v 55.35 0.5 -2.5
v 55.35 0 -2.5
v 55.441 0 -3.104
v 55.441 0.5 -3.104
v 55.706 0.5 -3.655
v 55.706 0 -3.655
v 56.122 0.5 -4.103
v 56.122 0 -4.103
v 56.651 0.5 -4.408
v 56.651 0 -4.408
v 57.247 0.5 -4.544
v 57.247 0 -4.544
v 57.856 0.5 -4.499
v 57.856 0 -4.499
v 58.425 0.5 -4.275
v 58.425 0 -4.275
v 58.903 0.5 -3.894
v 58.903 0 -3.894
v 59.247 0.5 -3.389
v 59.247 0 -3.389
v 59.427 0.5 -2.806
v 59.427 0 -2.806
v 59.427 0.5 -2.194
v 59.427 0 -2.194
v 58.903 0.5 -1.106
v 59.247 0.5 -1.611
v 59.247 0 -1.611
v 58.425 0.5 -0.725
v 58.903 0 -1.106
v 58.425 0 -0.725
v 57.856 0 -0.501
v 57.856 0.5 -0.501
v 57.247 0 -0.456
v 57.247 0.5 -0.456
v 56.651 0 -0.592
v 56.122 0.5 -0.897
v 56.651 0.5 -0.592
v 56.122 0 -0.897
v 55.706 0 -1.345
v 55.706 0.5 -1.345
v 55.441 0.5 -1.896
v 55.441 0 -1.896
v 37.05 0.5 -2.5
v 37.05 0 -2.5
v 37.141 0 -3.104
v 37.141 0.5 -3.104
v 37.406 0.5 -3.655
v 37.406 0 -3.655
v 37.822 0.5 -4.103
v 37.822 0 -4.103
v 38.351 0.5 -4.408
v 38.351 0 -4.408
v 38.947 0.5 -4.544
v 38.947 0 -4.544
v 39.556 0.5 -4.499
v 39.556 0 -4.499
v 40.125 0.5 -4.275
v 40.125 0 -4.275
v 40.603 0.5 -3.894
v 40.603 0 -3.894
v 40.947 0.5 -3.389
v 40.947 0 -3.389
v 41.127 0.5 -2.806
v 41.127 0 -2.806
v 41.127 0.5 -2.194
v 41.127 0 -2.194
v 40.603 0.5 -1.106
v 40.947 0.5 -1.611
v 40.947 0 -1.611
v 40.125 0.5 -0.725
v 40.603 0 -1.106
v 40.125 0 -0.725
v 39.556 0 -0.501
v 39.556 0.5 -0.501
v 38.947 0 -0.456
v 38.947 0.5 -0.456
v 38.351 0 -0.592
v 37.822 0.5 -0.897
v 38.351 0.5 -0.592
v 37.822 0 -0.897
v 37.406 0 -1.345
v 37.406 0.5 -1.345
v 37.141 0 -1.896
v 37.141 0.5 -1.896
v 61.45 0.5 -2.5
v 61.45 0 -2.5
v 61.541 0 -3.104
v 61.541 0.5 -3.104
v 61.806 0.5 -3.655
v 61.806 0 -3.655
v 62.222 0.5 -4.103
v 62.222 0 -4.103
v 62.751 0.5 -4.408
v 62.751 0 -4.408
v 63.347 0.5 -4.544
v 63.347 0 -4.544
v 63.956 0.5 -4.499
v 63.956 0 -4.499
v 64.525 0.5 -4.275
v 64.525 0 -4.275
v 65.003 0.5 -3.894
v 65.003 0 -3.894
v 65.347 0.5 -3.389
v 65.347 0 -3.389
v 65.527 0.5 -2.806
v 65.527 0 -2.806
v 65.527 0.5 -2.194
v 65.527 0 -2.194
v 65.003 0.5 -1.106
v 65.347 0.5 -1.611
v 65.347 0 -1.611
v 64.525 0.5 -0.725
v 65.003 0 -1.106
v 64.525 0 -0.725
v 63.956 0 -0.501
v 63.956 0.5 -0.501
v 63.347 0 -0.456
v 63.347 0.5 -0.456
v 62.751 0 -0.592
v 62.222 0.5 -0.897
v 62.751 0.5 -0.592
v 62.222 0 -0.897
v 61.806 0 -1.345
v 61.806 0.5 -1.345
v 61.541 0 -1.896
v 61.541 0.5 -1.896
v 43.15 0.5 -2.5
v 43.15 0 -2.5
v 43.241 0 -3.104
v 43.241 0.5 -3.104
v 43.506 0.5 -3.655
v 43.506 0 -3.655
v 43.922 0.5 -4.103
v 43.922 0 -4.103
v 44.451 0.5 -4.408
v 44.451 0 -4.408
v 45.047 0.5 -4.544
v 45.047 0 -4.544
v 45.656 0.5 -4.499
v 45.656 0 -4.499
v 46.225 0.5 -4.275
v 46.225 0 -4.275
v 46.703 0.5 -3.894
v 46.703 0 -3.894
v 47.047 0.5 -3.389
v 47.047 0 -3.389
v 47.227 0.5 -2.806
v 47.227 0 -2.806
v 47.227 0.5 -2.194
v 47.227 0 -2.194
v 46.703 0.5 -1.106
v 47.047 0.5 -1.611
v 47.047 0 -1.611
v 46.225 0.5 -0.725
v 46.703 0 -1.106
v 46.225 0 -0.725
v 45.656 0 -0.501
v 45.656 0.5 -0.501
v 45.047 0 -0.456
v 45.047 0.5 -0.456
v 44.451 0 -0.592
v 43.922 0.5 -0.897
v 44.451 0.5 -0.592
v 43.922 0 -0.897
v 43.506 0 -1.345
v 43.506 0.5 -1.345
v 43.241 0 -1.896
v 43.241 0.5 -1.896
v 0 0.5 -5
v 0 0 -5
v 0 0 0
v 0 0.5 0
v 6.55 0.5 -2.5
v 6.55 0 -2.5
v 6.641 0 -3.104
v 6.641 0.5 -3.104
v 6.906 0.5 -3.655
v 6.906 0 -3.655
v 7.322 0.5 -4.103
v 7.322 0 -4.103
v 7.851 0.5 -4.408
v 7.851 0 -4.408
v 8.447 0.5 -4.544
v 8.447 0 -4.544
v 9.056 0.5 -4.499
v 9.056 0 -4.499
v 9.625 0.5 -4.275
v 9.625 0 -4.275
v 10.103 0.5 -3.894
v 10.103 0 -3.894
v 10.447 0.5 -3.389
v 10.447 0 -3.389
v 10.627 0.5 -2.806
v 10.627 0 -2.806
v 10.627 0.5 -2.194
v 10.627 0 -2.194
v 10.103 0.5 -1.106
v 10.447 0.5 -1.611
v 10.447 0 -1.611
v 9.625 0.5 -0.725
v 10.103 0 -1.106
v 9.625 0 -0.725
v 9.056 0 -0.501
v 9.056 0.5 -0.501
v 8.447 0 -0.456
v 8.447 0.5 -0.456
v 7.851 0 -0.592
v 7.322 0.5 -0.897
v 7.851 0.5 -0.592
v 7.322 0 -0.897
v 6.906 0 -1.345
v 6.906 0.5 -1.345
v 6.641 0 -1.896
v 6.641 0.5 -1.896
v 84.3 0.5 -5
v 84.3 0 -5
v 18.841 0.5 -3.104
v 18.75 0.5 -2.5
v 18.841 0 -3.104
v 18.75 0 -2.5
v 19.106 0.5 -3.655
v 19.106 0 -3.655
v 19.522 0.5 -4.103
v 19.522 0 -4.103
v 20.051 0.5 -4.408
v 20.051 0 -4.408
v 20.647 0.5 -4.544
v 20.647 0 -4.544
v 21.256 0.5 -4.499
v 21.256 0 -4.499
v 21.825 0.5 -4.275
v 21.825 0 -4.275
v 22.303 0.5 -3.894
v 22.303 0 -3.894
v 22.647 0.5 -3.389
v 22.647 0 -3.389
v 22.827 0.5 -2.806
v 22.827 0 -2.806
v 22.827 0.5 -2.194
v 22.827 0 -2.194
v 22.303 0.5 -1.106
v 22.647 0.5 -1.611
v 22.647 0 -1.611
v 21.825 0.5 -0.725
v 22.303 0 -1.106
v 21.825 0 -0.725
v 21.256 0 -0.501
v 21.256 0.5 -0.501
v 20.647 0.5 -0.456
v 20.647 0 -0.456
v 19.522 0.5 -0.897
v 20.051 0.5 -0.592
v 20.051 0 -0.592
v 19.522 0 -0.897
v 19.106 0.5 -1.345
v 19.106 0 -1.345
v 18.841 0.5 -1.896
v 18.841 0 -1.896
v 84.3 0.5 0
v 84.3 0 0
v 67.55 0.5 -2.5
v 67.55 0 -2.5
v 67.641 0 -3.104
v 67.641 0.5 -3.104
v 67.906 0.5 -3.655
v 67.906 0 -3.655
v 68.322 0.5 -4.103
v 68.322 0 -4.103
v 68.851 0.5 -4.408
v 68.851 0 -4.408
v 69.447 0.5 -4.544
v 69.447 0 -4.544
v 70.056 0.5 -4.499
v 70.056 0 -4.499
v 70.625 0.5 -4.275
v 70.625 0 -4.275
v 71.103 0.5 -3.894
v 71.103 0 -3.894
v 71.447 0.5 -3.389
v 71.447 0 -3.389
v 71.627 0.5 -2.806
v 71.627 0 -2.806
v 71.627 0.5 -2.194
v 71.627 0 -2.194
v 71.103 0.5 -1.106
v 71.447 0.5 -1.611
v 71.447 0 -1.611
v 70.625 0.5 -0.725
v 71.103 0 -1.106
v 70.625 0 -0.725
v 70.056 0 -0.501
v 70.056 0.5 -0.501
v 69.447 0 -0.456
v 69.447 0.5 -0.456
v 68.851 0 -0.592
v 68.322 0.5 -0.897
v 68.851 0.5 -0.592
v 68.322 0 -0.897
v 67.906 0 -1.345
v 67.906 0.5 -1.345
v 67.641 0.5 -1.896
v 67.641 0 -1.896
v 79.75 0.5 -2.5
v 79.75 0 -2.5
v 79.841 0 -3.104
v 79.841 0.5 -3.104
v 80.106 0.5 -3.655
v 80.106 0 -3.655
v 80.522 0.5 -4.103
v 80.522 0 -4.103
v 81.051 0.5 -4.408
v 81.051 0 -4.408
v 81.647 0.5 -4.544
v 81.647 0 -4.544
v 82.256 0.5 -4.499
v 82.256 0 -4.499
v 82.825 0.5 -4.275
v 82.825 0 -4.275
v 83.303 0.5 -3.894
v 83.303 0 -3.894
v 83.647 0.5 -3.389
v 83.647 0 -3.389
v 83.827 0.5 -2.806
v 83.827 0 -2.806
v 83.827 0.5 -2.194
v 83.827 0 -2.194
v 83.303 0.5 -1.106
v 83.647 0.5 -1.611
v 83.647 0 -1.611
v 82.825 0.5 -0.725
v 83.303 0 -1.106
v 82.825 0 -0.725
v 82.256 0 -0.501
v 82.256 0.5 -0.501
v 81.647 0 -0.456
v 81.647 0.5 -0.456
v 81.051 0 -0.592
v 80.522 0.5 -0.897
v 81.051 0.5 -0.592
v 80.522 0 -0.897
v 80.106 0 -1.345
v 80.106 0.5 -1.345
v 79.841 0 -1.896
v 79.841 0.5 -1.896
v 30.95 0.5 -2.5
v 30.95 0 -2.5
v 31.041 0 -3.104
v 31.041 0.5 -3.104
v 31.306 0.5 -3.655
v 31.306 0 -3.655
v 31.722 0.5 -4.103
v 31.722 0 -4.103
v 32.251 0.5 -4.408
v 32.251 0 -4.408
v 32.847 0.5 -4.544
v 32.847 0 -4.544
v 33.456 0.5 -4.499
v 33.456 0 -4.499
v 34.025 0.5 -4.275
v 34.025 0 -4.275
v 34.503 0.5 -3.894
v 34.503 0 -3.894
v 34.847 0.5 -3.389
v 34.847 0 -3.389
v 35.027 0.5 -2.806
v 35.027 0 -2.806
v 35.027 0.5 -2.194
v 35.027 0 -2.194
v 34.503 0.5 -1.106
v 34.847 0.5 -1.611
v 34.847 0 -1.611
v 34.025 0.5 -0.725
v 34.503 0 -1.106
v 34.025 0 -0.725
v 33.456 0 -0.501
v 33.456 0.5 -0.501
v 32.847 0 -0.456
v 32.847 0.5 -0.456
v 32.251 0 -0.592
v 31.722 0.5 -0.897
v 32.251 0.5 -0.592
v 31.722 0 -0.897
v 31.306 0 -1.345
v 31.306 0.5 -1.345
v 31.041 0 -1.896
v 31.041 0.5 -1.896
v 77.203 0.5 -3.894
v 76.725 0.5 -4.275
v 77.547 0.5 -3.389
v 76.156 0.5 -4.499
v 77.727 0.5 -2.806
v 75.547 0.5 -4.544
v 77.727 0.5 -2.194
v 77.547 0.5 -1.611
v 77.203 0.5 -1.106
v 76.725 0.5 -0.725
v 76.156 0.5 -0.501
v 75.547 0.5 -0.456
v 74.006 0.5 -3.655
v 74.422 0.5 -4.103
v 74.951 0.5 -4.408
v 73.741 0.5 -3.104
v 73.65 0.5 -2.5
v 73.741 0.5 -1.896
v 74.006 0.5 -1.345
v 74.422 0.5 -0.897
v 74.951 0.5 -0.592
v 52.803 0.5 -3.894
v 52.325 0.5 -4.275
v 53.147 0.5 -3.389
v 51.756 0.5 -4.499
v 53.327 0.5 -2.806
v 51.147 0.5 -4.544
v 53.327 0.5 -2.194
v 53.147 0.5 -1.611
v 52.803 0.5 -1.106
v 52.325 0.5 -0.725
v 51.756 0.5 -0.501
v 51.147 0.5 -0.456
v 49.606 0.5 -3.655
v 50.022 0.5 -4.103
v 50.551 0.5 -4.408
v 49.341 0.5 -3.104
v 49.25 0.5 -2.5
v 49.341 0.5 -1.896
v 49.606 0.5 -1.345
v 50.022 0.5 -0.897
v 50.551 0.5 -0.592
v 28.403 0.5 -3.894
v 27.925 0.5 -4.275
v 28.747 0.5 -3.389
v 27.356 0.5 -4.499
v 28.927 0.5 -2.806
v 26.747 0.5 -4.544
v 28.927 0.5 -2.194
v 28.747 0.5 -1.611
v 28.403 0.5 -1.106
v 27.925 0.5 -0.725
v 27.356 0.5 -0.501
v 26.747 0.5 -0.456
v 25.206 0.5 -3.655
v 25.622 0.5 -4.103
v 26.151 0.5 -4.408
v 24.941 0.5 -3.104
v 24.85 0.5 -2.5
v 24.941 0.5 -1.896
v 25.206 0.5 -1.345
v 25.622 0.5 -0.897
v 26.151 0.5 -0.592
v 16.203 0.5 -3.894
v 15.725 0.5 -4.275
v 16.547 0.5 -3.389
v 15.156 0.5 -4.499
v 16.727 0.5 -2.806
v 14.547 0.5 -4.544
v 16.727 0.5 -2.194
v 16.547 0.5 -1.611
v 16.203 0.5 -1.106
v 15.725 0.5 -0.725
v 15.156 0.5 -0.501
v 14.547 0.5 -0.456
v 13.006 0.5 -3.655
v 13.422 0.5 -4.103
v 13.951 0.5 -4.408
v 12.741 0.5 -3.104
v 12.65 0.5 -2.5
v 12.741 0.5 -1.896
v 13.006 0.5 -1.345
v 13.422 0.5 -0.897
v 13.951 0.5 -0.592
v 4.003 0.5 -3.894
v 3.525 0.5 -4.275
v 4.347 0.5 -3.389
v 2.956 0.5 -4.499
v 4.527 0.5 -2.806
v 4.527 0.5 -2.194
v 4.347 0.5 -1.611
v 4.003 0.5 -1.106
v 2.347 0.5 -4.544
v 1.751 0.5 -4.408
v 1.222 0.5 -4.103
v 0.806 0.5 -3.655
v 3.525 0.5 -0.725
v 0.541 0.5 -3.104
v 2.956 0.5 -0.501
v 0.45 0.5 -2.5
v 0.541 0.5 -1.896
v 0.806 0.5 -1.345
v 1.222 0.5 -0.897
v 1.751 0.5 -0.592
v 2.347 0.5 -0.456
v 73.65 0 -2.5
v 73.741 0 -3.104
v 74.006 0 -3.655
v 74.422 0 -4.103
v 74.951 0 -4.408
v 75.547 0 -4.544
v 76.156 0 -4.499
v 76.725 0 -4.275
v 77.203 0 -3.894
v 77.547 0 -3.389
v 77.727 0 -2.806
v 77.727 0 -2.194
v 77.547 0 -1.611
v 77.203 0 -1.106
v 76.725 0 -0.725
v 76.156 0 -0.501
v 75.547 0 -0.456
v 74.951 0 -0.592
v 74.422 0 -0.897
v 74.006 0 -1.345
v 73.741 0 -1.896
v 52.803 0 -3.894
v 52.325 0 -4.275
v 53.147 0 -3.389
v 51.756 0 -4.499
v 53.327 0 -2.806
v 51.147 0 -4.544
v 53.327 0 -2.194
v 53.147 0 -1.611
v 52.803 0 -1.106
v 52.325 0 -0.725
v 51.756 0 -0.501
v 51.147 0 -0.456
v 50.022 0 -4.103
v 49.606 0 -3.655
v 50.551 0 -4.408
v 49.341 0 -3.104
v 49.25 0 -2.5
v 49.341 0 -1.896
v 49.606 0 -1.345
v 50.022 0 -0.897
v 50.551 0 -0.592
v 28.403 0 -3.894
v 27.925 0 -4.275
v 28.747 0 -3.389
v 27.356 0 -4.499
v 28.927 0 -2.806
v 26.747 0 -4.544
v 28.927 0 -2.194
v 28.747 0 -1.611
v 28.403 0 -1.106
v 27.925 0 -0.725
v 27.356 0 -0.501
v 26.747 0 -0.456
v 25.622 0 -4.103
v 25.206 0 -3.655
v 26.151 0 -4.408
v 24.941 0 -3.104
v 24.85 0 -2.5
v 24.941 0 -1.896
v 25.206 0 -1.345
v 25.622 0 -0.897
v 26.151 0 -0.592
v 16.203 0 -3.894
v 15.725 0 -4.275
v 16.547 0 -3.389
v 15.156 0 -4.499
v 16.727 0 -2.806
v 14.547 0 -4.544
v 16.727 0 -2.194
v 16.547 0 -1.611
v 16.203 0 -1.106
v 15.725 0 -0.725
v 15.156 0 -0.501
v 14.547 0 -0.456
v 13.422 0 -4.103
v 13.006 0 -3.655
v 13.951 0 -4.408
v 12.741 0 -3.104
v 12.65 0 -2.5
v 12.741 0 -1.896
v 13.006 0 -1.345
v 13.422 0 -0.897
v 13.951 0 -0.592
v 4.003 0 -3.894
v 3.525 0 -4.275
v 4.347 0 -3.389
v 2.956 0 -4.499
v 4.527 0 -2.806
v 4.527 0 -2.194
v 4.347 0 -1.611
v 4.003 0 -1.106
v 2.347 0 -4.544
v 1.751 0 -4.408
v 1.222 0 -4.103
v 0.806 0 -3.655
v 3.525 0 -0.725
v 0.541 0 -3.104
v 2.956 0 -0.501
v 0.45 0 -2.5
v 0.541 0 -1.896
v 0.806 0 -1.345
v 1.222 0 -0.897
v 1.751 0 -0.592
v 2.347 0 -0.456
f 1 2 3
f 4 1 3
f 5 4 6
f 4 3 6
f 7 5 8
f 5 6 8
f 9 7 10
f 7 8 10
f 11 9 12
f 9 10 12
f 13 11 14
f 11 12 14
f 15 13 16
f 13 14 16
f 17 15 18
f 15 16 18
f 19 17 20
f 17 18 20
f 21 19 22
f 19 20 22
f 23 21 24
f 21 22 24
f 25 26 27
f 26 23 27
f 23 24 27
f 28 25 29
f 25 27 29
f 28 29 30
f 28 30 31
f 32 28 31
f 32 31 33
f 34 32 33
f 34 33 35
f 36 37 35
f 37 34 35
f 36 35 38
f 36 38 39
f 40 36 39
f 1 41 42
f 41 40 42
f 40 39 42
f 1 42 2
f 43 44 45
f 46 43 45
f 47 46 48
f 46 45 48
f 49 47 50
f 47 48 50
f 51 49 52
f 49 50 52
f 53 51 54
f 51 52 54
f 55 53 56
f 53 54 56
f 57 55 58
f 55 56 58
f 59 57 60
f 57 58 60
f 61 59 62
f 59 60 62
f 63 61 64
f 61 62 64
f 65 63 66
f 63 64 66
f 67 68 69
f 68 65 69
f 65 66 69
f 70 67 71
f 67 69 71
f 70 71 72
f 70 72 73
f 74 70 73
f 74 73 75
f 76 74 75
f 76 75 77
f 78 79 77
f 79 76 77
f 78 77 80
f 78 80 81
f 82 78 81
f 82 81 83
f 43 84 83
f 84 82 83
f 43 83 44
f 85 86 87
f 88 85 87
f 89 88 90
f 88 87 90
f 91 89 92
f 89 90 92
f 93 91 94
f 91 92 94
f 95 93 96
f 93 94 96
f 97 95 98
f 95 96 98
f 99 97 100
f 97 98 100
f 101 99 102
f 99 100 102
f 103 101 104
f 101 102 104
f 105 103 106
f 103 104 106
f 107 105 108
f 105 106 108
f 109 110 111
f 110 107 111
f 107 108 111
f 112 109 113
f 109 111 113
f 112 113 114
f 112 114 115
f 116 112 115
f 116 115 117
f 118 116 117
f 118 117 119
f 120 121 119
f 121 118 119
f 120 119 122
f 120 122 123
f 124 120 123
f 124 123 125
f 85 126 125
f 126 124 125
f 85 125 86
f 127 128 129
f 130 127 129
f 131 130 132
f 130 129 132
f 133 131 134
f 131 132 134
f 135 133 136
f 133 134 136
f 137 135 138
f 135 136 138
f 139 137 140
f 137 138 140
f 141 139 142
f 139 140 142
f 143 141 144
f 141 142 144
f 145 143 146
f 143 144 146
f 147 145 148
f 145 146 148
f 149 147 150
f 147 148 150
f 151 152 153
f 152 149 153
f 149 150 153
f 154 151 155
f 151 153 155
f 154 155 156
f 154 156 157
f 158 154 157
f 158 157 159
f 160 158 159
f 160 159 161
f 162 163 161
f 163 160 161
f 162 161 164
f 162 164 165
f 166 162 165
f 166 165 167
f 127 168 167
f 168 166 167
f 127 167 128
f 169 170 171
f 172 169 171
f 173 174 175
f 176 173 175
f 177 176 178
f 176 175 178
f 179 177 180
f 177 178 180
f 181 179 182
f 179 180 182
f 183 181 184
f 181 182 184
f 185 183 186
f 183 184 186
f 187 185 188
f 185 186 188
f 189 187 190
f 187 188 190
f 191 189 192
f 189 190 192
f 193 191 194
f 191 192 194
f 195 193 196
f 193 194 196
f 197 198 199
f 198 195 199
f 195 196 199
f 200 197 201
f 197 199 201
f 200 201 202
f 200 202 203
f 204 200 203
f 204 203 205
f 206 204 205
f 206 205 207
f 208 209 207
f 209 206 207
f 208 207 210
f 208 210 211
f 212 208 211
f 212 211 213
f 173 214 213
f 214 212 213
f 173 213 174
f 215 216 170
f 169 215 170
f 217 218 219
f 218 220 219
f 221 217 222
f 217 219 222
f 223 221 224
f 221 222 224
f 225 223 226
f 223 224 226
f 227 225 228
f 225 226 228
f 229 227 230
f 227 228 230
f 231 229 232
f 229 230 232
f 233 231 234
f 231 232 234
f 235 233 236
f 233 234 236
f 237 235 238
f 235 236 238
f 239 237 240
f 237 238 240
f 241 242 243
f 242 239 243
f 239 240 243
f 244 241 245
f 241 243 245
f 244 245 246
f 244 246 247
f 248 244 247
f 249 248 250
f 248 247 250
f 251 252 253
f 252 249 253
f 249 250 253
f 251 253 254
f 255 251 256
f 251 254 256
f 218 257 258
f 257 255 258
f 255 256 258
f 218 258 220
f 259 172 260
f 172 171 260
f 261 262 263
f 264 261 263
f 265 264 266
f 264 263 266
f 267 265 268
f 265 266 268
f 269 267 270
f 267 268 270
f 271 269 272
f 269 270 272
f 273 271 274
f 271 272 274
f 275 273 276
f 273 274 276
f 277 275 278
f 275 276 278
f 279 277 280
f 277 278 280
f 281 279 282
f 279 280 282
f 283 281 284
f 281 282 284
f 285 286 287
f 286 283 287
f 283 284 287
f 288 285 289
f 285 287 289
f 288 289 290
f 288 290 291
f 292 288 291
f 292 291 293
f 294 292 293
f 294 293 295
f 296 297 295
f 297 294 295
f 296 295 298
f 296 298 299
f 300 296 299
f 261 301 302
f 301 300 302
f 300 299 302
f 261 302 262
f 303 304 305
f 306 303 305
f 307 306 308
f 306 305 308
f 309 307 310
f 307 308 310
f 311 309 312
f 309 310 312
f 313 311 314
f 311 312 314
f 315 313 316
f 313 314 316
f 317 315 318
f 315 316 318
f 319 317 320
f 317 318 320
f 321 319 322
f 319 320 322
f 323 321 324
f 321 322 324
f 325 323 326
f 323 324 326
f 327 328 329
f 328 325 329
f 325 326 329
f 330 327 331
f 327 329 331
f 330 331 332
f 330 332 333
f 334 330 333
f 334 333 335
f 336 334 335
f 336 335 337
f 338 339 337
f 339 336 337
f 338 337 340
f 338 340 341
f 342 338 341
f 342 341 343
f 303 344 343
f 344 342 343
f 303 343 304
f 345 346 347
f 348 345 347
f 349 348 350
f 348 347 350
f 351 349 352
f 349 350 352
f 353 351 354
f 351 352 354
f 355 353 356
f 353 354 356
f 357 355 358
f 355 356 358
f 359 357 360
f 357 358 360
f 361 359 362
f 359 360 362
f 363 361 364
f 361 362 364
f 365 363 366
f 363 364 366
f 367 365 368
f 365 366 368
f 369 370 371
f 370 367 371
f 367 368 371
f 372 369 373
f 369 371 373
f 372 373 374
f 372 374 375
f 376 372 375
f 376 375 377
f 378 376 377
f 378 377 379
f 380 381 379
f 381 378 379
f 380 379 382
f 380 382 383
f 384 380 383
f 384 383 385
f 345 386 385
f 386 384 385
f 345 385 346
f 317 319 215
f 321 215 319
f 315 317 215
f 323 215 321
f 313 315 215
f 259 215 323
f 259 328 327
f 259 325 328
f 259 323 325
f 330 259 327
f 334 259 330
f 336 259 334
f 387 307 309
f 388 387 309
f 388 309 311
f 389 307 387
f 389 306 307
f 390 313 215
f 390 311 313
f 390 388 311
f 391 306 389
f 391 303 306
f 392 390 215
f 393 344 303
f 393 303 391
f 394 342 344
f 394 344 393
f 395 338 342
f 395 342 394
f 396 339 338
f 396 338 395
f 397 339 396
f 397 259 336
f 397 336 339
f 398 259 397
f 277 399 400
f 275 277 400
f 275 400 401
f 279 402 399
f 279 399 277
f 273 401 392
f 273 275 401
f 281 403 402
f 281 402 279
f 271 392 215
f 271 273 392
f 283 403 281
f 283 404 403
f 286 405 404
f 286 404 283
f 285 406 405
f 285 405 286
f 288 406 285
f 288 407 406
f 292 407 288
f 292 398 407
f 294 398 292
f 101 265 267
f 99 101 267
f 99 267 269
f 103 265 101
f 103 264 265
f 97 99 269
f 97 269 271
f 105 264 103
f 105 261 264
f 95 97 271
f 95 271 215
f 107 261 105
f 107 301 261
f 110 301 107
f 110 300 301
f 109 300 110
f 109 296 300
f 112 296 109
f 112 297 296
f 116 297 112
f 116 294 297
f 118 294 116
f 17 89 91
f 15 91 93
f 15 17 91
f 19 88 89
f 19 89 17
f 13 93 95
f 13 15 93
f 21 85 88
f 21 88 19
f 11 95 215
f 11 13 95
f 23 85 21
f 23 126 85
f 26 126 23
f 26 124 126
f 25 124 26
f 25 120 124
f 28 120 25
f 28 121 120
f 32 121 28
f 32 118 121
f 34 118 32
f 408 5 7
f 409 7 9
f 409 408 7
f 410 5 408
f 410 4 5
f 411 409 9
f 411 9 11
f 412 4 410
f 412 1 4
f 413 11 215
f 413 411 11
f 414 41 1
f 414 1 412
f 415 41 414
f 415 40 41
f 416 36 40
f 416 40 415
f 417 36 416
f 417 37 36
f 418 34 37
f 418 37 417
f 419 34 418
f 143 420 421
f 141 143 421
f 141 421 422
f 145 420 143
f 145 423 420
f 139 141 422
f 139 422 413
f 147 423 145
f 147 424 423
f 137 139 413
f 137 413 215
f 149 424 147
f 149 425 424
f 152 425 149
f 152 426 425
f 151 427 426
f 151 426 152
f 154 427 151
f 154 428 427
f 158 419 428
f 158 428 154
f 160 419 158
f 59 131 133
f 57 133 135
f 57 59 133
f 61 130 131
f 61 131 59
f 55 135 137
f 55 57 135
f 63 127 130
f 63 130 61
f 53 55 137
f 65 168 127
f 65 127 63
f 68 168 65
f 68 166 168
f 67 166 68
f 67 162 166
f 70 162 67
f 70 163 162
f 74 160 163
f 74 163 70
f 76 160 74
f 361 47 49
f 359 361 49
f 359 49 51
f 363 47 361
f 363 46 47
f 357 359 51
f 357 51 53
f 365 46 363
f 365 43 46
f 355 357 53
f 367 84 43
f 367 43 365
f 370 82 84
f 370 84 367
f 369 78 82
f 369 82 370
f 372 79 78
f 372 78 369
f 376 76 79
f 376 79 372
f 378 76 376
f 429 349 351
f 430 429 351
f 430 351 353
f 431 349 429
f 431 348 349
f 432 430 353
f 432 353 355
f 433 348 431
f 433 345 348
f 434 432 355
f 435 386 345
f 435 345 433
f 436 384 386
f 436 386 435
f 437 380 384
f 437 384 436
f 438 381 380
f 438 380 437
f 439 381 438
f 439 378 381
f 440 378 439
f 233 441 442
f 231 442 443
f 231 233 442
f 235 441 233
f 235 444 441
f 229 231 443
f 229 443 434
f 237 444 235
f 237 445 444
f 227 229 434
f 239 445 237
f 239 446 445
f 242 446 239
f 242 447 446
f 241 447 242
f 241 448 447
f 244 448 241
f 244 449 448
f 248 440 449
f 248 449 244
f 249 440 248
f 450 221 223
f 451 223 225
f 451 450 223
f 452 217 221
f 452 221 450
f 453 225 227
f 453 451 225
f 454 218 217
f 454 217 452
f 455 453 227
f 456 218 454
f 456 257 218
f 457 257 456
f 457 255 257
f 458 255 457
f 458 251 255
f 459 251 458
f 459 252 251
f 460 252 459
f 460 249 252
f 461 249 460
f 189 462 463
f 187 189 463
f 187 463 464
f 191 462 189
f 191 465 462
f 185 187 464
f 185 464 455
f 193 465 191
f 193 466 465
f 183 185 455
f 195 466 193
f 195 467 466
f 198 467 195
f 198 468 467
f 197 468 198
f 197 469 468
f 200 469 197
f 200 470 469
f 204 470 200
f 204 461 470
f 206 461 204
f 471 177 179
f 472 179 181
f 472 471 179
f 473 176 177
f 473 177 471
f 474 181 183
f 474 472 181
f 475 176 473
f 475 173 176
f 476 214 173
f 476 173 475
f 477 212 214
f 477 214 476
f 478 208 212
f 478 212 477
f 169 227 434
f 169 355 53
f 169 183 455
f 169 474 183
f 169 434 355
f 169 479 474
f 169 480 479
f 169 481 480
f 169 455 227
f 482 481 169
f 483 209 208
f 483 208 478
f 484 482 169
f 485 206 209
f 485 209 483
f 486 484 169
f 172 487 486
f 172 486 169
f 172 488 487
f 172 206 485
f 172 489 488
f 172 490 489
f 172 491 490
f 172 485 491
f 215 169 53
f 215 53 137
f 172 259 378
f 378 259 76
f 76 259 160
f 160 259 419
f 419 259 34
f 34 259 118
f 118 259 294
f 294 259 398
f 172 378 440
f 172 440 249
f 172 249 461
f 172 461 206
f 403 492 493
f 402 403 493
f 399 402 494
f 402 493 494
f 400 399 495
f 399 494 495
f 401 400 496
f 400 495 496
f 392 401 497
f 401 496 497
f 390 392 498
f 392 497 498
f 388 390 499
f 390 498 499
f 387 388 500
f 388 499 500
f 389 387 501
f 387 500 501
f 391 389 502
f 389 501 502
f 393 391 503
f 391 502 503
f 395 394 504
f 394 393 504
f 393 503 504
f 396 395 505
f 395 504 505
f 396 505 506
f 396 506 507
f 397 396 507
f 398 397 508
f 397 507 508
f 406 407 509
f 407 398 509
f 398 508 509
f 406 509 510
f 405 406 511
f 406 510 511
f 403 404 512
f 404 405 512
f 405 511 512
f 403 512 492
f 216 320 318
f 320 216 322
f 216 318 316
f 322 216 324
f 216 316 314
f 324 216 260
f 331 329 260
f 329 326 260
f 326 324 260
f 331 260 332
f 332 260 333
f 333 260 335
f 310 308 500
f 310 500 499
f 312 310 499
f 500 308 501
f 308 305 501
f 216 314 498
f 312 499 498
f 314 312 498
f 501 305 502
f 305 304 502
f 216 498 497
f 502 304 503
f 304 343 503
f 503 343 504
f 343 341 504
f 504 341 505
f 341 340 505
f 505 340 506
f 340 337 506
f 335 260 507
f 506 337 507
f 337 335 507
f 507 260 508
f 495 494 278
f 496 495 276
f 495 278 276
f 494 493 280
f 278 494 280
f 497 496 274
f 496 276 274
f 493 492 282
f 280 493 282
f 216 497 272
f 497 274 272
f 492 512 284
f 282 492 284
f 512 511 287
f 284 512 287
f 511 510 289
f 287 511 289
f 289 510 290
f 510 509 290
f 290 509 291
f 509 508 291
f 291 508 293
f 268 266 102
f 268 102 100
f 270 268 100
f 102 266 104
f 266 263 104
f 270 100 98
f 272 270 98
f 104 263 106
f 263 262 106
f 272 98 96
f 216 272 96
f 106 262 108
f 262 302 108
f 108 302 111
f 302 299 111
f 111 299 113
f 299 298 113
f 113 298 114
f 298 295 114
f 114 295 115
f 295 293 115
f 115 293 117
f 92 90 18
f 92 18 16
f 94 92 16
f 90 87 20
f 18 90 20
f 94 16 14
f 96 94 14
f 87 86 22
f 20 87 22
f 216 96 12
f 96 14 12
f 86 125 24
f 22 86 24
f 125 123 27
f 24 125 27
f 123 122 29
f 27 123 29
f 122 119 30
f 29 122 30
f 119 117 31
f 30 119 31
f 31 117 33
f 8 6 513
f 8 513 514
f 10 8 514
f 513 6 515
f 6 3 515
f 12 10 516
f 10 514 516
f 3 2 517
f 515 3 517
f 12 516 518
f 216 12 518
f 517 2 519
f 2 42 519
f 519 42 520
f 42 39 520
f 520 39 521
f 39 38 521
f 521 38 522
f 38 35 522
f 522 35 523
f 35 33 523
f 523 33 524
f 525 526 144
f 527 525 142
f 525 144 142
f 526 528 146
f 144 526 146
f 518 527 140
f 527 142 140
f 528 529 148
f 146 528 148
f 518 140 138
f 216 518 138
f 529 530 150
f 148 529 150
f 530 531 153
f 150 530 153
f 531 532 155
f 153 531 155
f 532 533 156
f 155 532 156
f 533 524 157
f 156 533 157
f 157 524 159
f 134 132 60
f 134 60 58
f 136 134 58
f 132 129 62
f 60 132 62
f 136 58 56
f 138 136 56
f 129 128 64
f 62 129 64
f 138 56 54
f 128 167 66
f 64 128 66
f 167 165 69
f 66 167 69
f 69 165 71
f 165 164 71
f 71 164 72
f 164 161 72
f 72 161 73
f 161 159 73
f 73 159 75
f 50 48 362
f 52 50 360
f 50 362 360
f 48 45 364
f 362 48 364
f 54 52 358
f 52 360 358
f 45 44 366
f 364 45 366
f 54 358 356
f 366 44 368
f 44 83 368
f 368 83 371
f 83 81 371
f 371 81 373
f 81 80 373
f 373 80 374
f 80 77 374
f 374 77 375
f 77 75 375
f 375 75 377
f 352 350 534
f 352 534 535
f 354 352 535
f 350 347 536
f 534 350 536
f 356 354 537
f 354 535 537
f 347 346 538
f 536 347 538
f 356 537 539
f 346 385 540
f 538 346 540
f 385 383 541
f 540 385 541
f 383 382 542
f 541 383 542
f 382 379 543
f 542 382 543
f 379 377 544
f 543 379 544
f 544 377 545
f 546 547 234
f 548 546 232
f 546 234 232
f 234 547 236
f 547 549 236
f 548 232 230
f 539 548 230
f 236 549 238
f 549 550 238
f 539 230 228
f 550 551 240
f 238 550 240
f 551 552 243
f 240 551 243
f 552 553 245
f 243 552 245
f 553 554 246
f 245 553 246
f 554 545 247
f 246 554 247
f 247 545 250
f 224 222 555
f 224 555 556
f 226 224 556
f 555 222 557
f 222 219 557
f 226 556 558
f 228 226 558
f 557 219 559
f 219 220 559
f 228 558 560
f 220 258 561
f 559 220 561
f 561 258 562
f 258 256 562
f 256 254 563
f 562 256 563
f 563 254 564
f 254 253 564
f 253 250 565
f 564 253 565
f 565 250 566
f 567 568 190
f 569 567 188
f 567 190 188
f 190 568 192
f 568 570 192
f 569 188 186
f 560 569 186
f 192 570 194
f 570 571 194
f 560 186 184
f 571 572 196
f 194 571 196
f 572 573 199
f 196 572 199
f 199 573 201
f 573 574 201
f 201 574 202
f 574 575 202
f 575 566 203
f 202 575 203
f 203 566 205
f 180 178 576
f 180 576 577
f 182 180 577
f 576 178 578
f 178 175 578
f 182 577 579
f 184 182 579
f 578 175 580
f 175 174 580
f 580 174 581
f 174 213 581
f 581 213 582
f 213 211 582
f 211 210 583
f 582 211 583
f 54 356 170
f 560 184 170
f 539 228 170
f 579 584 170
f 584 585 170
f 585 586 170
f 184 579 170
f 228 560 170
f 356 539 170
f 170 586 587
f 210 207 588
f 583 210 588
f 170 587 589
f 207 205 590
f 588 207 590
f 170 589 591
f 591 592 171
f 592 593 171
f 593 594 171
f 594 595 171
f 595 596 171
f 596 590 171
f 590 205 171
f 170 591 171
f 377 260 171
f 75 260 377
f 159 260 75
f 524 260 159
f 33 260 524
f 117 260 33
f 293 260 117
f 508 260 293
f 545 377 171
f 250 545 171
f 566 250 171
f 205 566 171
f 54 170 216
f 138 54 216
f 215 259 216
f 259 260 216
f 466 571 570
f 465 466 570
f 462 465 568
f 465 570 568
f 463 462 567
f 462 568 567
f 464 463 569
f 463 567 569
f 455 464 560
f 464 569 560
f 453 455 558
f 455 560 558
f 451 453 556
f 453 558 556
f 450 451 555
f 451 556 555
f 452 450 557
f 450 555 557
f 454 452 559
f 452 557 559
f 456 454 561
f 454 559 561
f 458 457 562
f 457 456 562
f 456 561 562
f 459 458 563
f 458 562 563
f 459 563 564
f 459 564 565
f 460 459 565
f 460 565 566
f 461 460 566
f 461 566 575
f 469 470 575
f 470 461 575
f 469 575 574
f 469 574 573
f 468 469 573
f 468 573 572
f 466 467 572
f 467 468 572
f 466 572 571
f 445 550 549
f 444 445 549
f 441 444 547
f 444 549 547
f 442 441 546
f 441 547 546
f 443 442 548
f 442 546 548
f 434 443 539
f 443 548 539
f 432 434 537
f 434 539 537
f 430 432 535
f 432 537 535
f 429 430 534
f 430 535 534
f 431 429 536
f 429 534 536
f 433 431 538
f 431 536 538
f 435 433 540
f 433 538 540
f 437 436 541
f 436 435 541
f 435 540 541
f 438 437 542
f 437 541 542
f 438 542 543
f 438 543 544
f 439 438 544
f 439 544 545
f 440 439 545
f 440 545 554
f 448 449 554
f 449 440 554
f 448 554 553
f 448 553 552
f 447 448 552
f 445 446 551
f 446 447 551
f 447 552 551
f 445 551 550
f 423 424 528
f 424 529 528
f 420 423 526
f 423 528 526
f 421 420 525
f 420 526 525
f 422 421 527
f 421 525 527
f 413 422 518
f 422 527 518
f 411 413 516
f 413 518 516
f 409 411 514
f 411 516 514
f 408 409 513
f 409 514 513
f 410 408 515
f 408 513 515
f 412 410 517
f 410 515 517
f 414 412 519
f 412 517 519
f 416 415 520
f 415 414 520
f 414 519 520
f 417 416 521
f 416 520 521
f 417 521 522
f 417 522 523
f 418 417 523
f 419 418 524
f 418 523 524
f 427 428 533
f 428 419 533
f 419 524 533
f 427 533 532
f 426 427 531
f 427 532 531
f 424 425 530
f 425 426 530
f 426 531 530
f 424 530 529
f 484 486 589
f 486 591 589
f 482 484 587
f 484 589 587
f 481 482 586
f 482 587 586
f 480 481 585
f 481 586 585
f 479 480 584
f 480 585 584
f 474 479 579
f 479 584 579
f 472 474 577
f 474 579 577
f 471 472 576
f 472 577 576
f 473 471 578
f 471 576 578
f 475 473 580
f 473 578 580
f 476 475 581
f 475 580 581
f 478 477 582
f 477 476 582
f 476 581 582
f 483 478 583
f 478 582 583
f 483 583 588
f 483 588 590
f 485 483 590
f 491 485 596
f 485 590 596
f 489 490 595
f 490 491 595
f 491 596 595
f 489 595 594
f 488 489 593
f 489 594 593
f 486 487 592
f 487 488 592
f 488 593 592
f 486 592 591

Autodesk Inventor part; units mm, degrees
ref_plane "YZ Plane" through (0, 0, 0) normal (1, 0, 0) x (0, 1, 0)
ref_plane "XZ Plane" through (0, 0, 0) normal (0, 1, 0) x (-1, 0, 0)
ref_plane "XY Plane" through (0, 0, 0) normal (0, 0, 1) x (1, 0, 0)
sketch "Sketch1" plane through (0, 0, 0) normal (0, 1, 0) x (-1, 0, 0)
  line L0 (0, 0) -> (-84.3, 0)
  line L1 (-84.3, 0) -> (-84.3, -5)
  line L2 (-84.3, -5) -> (0, -5)
  line L3 (0, -5) -> (0, 0)
  circle A0 centre (-2.5, -2.5) radius 2.05
  circle A1 centre (-8.6, -2.5) radius 2.05
  circle A2 centre (-14.7, -2.5) radius 2.05
  circle A3 centre (-20.8, -2.5) radius 2.05
  circle A4 centre (-26.9, -2.5) radius 2.05
  circle A5 centre (-33, -2.5) radius 2.05
  circle A6 centre (-39.1, -2.5) radius 2.05
  circle A7 centre (-45.2, -2.5) radius 2.05
  circle A8 centre (-51.3, -2.5) radius 2.05
  circle A9 centre (-57.4, -2.5) radius 2.05
  circle A10 centre (-63.5, -2.5) radius 2.05
  circle A11 centre (-69.6, -2.5) radius 2.05
  circle A12 centre (-75.7, -2.5) radius 2.05
  circle A13 centre (-81.8, -2.5) radius 2.05
  dimension "d1" = 5
  dimension "d3" = 4.1
  dimension "d4" = 2.5
  dimension "d5" = 2.5
  dimension "d8" = 6.1
  dimension "d13" = 2.5
  dimension "d16" = 6.1
  dimension "d17" = 4.1
  dimension "d18" = 2.5
extrude "Extrusion1" add sketch "Sketch1" along normal blind 0.5
equation "\"d5\" = d4"
equation "\"d18\" = d5"
properties part number "separator-kul" material "Polycarbonate, Smoke"
